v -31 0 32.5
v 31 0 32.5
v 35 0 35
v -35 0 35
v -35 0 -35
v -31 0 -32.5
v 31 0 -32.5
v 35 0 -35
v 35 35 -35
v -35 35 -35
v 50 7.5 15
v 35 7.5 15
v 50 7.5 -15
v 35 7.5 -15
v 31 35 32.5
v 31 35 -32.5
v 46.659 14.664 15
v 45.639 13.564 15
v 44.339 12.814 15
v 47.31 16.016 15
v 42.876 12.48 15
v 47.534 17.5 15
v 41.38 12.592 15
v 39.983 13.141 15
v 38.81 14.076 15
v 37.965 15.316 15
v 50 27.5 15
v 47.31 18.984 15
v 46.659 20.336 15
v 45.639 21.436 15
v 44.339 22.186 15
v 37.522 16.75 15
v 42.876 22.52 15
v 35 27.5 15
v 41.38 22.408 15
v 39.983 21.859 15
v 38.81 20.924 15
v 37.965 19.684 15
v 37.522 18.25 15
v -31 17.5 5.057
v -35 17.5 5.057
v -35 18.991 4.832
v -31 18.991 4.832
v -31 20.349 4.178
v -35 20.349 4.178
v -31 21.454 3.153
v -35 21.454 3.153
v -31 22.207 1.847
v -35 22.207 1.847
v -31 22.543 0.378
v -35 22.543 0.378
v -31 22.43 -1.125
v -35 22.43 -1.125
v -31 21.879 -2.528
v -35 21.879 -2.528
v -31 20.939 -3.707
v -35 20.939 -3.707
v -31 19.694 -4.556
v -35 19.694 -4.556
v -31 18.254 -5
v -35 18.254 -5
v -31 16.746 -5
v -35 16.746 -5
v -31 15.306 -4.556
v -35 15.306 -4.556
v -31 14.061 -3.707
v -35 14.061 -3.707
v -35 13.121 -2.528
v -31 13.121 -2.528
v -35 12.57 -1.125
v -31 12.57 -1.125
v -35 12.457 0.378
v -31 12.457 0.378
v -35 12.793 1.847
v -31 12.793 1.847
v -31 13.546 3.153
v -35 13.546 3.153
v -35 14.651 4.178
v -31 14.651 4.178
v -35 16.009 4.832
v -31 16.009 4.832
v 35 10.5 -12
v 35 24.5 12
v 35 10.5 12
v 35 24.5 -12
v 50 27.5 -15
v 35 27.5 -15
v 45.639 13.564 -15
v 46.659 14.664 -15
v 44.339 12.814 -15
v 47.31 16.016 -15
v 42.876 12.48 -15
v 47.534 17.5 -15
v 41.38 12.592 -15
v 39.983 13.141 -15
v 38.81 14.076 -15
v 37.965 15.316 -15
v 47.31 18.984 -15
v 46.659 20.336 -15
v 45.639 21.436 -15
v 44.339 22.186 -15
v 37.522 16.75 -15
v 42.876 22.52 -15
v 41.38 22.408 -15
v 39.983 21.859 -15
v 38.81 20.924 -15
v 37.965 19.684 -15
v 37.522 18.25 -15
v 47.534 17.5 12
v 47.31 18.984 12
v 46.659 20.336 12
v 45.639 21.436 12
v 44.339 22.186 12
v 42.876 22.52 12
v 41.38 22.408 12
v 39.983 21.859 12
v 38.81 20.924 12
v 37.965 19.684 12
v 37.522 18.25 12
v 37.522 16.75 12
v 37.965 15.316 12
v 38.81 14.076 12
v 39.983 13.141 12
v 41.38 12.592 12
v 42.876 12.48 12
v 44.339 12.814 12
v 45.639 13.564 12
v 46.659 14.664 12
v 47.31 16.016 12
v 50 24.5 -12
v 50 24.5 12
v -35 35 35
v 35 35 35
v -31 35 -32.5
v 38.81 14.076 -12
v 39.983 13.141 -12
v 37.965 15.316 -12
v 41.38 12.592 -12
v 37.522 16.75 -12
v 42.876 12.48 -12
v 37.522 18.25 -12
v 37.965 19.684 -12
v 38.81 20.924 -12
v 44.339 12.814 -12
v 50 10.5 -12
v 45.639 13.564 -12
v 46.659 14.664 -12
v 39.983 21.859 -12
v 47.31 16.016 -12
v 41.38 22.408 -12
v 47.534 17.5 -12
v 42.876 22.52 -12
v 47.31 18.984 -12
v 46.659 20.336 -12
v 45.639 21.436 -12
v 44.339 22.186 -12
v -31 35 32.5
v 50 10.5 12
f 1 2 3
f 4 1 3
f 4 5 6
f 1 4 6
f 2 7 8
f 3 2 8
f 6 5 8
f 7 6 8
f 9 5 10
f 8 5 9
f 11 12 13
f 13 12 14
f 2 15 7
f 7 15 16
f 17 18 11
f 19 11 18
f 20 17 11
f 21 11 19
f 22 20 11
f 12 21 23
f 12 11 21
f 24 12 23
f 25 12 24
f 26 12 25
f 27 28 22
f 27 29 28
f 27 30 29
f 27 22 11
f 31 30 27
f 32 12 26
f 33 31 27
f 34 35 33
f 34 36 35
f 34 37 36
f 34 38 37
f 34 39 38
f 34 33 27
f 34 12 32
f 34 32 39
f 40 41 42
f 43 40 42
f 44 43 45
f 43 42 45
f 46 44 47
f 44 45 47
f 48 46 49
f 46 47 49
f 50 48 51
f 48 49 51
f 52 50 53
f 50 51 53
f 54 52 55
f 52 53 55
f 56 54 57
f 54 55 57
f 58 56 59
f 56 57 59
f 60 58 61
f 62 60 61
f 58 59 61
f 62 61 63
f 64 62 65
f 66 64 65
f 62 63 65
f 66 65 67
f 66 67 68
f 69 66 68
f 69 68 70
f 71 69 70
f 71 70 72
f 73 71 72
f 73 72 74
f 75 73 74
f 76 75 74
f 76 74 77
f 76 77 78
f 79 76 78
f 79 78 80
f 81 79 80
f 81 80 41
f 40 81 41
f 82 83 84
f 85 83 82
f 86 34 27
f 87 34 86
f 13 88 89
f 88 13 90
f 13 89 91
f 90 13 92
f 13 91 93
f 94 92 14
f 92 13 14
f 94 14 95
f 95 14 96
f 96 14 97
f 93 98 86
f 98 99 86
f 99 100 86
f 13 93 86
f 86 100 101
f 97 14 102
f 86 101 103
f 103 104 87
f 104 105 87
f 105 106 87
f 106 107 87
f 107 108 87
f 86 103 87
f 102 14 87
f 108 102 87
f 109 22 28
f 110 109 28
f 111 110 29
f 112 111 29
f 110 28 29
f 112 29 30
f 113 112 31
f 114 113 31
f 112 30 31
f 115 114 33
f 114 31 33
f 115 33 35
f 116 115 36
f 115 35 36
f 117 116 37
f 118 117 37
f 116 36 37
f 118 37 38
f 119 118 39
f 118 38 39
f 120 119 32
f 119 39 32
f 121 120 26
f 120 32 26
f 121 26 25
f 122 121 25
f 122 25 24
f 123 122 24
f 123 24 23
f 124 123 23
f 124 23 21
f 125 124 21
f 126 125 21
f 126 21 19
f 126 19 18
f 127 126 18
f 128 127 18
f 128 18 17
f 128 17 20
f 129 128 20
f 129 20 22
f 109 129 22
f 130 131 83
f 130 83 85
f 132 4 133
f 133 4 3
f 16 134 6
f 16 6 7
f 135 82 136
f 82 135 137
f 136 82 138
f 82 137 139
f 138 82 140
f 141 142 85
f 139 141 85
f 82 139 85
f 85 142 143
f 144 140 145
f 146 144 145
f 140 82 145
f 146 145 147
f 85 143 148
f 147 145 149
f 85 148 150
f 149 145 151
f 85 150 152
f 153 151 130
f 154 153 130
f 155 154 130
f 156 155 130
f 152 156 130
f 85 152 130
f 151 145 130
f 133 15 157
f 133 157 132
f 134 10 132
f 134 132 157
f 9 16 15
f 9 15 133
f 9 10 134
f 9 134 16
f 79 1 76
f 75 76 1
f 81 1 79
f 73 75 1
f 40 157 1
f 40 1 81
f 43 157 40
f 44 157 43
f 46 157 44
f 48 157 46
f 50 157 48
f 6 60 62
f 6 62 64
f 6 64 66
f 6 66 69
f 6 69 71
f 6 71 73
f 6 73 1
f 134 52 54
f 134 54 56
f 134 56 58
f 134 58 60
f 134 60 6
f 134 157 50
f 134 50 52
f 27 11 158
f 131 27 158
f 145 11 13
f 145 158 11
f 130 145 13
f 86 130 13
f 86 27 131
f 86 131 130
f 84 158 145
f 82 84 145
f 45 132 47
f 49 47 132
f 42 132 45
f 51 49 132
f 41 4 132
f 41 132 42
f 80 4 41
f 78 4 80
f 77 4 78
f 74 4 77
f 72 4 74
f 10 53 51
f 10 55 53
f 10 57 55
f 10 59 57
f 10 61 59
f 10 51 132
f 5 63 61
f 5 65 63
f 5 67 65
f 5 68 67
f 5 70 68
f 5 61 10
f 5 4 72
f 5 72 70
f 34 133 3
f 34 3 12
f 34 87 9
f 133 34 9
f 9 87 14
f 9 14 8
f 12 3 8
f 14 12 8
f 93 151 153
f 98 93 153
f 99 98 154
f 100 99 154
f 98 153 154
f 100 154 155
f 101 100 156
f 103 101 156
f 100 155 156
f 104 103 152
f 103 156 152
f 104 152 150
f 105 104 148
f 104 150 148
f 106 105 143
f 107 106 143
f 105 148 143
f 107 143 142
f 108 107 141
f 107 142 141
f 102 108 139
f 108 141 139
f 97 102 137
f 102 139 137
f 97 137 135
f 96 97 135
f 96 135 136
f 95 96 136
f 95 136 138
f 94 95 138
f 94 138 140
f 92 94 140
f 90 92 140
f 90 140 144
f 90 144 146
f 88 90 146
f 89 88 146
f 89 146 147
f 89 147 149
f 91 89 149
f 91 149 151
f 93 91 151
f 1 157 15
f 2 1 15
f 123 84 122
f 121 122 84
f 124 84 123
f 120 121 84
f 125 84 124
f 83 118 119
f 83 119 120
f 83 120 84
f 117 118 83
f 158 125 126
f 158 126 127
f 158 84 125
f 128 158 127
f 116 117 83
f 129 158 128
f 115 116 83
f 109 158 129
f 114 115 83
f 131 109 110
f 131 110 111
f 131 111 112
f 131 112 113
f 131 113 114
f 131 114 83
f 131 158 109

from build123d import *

# Parameters (mm, degrees)
SKETCH1_W           = 70
SKETCH1_H           = 70
BOSS_EXTRUDE1_DEPTH = 35
SKETCH2_W           = 62
SKETCH2_H           = 65
CUT_EXTRUDE1_DEPTH  = 61.621778265
SKETCH3_R           = 5.056768915
CUT_EXTRUDE2_DEPTH  = 15
SKETCH4_W           = 30
SKETCH4_H           = 20
BOSS_EXTRUDE2_DEPTH = 15
SKETCH6_W           = 24
SKETCH6_H           = 14
CUT_EXTRUDE3_DEPTH  = 15
SKETCH7_R           = 5.033880115
CUT_EXTRUDE4_DEPTH  = 79.89866919


with BuildPart() as part:
    # Sketch1 → Boss-Extrude1 (new body)
    with BuildSketch(Plane(origin=(0, 0, 0), x_dir=(1, 0, 0), z_dir=(0, 1, 0))):
        Rectangle(SKETCH1_W, SKETCH1_H)
    extrude(amount=BOSS_EXTRUDE1_DEPTH)

    # Sketch2 → Cut-Extrude1 (cut, through all)
    with BuildSketch(Plane(origin=(0, 35, 0), x_dir=(1, 0, 0), z_dir=(0, 1, 0))):
        Rectangle(SKETCH2_W, SKETCH2_H)
    extrude(amount=-CUT_EXTRUDE1_DEPTH, mode=Mode.SUBTRACT)

    # Sketch3 → Cut-Extrude2 (cut)
    with BuildSketch(Plane.ZY.offset(35)):
        with Locations((0, 17.5)):
            Circle(SKETCH3_R)
    extrude(amount=-CUT_EXTRUDE2_DEPTH, mode=Mode.SUBTRACT)

    # Sketch4 → Boss-Extrude2 (add)
    with BuildSketch(Plane(origin=(35, 0, 0), x_dir=(0, 0, -1), z_dir=(1, 0, 0))):
        with Locations((0, 17.5)):
            Rectangle(SKETCH4_W, SKETCH4_H)
    extrude(amount=BOSS_EXTRUDE2_DEPTH)

    # Sketch6 → Cut-Extrude3 (cut)
    with BuildSketch(Plane(origin=(50, 0, 0), x_dir=(0, 0, -1), z_dir=(1, 0, 0))):
        with Locations((0, 17.5)):
            Rectangle(SKETCH6_W, SKETCH6_H)
    extrude(amount=-CUT_EXTRUDE3_DEPTH, mode=Mode.SUBTRACT)

    # Sketch7 → Cut-Extrude4 (cut, through all)
    with BuildSketch(Plane.XY.offset(15)):
        with Locations((42.5, 17.5)):
            Circle(SKETCH7_R)
    extrude(amount=-CUT_EXTRUDE4_DEPTH, mode=Mode.SUBTRACT)


solid = part.part
